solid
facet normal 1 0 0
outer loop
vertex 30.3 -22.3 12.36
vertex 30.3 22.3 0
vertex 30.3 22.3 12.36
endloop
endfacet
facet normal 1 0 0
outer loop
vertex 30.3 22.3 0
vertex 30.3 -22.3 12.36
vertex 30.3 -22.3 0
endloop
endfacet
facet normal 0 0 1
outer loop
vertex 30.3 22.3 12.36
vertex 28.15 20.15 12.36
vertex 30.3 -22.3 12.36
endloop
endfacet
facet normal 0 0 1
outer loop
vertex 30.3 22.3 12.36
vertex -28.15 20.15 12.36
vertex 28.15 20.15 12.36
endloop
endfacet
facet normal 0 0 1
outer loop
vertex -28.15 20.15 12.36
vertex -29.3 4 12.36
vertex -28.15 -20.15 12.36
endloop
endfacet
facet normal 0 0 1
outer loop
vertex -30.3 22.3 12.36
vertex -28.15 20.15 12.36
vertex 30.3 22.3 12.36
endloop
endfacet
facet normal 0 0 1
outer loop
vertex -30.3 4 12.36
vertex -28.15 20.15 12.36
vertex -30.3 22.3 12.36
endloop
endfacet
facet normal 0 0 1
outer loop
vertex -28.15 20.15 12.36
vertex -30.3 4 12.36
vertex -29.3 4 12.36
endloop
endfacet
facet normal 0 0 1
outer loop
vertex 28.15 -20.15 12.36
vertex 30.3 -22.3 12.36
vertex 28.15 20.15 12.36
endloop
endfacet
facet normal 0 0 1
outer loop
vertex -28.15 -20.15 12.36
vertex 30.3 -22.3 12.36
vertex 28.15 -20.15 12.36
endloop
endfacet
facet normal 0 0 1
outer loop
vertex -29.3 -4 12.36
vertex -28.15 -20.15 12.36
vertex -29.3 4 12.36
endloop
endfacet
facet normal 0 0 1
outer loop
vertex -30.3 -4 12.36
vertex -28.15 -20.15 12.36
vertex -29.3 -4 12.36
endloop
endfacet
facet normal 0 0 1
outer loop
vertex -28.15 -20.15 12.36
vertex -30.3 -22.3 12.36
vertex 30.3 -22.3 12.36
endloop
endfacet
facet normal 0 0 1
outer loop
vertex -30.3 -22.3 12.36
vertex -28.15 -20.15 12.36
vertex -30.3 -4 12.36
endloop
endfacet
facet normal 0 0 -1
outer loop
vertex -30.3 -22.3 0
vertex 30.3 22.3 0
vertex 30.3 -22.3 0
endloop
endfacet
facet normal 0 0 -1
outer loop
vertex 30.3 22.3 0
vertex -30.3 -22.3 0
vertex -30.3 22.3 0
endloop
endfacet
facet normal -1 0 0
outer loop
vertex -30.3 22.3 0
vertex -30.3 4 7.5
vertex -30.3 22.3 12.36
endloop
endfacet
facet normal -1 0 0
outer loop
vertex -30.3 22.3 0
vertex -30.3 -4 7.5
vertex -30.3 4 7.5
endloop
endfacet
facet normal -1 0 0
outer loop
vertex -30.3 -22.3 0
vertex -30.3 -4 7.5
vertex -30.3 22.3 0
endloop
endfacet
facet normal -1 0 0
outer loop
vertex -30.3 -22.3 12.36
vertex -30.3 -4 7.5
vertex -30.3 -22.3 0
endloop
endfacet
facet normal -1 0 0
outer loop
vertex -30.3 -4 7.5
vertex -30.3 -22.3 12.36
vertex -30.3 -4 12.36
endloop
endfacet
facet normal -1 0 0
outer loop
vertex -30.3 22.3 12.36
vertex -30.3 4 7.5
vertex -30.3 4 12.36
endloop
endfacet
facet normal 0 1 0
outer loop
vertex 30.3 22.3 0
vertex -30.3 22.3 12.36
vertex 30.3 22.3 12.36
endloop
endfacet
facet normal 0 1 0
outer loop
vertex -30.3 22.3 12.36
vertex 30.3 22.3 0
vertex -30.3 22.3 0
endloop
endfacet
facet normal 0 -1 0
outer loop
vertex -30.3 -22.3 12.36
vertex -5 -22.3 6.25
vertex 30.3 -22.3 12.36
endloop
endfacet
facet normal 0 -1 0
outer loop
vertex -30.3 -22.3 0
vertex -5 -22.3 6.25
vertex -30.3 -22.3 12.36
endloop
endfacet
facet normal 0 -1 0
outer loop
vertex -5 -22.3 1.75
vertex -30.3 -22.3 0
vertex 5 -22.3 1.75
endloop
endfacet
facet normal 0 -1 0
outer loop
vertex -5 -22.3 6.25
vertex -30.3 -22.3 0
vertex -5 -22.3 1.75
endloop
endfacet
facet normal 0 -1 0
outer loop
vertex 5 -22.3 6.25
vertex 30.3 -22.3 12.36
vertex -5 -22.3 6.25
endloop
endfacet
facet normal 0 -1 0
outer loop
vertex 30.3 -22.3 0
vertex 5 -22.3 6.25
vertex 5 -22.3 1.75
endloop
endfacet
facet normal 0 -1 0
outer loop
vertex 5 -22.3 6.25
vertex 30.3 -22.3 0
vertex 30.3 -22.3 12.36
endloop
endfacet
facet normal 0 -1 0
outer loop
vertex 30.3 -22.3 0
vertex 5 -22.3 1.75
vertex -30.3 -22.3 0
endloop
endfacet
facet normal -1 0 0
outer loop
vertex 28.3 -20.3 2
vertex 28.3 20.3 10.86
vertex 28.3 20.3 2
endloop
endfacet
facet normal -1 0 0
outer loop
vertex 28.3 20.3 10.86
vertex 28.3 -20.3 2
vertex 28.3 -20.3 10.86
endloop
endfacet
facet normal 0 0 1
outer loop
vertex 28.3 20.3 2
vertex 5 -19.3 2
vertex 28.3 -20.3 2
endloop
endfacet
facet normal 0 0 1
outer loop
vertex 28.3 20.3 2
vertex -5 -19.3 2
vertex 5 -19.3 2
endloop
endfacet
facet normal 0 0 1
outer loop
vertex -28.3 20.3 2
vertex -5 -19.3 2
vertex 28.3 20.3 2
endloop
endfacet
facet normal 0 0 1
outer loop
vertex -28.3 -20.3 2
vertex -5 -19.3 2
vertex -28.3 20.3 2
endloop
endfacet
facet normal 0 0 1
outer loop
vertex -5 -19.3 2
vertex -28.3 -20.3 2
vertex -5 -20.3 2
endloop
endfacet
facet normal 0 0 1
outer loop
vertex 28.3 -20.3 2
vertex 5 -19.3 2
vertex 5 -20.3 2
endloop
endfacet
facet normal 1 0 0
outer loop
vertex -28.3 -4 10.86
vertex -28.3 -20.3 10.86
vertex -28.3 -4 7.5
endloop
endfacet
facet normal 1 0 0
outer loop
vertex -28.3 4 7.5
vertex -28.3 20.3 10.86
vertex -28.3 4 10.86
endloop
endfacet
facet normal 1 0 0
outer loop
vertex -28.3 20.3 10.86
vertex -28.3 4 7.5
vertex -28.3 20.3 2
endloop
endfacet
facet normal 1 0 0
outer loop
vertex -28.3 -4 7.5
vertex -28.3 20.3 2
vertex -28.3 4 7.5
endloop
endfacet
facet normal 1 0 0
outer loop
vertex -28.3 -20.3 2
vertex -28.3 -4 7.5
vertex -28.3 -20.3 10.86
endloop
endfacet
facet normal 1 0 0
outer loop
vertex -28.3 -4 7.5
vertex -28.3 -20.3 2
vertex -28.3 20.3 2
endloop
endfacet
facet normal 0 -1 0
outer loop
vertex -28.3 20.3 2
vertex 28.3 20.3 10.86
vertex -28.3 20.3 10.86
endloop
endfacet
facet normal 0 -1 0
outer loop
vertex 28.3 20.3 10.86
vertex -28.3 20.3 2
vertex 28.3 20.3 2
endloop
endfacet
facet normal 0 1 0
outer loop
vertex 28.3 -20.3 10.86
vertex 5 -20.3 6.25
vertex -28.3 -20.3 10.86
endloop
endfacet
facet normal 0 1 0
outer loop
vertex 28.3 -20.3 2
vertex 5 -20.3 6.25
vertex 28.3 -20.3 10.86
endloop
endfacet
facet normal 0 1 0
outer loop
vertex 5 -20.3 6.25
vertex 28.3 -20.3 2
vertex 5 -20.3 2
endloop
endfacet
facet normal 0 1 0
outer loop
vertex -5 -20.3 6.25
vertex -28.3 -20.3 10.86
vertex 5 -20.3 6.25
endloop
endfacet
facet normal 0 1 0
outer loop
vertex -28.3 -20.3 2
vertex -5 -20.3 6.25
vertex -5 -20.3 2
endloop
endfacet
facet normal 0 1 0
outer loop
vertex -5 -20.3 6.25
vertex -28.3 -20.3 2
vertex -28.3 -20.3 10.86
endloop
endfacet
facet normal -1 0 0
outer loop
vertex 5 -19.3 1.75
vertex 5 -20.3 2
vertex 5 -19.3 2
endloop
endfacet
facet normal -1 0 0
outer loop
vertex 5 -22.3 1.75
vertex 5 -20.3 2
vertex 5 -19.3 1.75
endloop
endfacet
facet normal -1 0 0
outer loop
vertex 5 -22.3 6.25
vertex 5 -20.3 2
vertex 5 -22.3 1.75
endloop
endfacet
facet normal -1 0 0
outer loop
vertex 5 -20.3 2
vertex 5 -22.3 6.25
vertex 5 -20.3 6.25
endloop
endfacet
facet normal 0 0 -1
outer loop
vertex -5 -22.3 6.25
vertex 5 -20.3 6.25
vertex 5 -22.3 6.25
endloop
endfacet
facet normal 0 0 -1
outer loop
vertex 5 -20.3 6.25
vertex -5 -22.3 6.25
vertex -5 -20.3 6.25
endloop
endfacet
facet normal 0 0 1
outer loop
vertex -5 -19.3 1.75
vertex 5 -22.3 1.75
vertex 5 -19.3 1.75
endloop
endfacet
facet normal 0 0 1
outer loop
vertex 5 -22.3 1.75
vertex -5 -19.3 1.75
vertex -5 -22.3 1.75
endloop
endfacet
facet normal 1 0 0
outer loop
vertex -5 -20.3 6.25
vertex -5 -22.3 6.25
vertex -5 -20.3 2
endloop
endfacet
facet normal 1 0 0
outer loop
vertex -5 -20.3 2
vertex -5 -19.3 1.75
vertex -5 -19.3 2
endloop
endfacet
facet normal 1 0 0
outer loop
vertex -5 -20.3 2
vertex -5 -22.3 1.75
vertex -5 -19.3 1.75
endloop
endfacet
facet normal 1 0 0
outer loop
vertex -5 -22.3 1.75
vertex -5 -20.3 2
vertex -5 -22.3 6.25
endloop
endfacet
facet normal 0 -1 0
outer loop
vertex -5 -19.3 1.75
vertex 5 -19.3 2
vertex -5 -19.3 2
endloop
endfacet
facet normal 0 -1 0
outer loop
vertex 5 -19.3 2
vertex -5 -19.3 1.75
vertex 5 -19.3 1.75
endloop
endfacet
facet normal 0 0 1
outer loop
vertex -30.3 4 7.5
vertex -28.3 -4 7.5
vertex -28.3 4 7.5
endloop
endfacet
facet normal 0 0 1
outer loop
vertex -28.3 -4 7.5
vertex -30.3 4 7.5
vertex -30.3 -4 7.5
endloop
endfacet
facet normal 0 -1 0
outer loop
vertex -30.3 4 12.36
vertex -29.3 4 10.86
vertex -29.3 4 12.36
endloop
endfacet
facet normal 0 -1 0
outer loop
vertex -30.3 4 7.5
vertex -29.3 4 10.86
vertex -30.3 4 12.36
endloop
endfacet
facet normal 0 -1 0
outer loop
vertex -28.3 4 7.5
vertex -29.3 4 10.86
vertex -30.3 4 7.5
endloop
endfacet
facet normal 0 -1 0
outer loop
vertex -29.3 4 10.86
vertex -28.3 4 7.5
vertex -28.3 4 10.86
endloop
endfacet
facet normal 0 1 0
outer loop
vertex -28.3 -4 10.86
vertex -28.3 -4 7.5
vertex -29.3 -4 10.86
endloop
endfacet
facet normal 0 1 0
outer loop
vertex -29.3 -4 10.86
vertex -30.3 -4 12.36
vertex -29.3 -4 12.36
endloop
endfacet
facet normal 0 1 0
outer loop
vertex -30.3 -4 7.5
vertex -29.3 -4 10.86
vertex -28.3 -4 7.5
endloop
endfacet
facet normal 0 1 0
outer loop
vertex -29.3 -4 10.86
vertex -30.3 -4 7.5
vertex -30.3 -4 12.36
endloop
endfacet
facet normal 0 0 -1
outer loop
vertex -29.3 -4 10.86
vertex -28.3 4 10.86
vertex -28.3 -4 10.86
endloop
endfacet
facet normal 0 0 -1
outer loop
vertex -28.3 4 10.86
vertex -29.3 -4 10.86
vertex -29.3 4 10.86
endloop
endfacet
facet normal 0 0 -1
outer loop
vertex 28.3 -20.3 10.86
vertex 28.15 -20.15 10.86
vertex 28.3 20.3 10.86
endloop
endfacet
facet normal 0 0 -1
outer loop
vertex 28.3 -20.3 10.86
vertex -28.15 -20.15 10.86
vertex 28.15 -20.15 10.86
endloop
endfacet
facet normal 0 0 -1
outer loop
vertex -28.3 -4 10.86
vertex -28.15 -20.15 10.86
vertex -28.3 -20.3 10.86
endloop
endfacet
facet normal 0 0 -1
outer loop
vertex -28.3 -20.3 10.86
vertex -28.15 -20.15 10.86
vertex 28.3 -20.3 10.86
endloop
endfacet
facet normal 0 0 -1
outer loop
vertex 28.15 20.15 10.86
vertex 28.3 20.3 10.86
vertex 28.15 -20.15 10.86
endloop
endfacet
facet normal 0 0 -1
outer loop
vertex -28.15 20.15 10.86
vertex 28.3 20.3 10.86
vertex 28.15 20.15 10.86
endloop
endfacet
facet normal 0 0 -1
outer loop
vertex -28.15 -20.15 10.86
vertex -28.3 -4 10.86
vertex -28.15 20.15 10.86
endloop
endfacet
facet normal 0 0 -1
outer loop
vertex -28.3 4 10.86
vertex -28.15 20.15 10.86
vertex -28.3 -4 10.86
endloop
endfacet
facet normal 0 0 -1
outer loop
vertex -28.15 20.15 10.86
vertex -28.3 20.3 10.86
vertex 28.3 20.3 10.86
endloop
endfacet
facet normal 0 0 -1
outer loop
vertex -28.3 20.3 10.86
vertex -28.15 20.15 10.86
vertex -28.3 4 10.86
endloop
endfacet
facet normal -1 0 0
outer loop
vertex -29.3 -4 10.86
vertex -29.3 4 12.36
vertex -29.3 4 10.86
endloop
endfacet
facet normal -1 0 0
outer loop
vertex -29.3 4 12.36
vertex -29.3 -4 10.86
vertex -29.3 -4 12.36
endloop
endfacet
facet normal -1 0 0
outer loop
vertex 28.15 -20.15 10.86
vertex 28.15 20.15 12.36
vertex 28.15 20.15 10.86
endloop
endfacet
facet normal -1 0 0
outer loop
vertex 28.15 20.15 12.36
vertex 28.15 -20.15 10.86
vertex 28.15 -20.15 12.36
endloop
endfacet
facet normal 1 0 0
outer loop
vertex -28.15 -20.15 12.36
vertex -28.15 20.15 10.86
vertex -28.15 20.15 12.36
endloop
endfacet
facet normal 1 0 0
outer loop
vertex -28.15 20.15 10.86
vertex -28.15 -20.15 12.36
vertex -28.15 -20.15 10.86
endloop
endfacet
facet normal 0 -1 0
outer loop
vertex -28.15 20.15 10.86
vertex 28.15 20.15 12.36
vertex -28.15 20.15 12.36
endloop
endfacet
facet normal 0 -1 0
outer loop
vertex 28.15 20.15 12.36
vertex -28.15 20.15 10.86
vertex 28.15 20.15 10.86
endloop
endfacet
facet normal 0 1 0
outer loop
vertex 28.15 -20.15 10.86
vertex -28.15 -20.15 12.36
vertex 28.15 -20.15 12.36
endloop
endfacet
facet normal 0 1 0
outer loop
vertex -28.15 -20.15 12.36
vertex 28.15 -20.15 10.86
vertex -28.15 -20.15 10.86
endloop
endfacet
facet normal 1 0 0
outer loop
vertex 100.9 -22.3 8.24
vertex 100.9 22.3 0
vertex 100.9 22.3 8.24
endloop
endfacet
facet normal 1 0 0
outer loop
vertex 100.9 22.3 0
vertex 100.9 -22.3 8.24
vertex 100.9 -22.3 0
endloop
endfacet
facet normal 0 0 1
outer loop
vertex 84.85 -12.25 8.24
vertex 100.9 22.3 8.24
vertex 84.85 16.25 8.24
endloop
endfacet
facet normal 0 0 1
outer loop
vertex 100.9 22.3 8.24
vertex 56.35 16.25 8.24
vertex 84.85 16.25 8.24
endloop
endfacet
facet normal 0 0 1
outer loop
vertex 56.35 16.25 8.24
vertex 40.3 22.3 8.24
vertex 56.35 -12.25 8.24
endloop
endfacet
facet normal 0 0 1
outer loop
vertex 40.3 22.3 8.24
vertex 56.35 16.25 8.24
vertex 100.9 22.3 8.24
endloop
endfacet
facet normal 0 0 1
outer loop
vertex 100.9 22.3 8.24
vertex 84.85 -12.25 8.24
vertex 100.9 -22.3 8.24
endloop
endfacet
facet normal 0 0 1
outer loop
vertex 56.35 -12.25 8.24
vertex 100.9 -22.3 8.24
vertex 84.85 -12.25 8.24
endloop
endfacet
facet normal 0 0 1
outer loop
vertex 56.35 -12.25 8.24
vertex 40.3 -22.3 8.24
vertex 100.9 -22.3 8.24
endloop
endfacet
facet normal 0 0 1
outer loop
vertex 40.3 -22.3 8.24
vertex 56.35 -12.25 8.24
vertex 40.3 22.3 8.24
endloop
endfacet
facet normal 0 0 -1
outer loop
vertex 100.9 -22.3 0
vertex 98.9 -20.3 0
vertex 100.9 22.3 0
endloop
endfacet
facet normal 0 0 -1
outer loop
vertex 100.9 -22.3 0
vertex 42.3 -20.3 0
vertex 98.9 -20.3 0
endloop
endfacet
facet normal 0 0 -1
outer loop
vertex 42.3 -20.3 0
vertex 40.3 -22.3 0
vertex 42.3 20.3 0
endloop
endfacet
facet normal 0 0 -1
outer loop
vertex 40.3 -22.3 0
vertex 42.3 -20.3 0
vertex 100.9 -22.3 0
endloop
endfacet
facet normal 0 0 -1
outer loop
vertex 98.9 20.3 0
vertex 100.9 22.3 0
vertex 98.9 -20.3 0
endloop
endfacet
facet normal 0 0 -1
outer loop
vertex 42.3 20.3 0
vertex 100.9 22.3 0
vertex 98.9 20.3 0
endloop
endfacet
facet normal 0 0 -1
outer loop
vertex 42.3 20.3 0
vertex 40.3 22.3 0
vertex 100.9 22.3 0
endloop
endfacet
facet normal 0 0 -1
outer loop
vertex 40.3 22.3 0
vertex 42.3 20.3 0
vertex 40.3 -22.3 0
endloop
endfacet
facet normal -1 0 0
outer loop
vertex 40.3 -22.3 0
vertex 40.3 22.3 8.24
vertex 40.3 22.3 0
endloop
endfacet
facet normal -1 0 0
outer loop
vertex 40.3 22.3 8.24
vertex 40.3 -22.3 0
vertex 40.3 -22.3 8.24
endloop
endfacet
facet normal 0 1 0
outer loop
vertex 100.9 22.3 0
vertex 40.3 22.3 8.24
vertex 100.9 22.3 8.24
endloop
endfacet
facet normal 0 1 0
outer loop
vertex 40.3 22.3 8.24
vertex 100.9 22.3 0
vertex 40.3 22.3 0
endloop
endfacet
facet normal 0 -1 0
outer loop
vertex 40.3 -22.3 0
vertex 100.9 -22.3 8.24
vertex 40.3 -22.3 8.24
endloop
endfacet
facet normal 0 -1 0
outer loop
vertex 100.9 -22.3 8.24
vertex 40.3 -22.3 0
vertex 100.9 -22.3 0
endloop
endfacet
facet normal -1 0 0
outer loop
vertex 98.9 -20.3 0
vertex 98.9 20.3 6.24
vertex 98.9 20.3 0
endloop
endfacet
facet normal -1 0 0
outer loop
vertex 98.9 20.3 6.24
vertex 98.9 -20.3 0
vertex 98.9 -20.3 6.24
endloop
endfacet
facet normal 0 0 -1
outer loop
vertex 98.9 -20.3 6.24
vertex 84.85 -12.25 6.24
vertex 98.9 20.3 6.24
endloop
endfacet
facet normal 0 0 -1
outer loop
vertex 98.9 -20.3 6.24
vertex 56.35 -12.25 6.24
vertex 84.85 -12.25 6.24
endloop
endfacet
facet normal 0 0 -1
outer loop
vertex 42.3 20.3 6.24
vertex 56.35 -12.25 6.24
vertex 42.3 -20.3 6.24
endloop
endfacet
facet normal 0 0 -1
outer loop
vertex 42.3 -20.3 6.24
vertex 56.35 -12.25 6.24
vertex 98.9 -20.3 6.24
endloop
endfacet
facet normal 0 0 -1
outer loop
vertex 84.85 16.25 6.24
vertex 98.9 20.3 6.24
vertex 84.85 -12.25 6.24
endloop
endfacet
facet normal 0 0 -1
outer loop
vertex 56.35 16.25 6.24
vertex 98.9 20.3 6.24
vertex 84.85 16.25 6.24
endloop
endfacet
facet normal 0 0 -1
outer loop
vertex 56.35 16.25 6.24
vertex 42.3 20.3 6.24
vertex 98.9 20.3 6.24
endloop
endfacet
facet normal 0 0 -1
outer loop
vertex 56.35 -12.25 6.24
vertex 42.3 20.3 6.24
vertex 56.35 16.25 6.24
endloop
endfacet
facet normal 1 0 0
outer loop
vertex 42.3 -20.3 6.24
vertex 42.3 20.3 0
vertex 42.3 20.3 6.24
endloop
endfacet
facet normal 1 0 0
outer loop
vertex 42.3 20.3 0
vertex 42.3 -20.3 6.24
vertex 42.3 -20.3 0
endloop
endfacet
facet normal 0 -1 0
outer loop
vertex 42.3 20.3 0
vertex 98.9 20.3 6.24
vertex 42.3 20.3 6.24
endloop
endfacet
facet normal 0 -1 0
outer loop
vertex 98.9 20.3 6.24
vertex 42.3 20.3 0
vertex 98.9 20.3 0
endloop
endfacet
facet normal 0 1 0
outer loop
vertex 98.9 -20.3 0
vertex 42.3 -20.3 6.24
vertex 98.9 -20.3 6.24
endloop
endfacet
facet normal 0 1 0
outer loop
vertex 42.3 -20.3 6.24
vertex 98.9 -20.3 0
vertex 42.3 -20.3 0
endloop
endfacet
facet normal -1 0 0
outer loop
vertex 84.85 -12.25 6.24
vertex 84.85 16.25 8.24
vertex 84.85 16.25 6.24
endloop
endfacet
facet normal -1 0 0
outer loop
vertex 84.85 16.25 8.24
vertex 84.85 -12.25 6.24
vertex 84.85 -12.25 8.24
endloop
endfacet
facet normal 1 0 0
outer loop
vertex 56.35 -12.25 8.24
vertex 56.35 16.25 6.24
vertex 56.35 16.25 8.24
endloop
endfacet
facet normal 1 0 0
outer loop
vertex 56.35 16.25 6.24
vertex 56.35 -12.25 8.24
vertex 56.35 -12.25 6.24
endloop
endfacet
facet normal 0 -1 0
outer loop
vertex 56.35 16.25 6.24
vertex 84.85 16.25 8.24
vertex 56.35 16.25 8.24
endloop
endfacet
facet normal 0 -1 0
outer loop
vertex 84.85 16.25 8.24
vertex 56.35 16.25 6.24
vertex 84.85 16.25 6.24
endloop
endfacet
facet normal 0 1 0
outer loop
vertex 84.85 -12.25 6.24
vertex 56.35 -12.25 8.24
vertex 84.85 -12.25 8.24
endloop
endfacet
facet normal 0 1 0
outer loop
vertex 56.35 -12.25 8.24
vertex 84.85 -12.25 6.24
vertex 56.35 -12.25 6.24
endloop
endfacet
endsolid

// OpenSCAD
// file: BOSL2/std.scad
// Minimal BOSL2 compatibility shim for bundled gallery models.
// It implements only the helpers used by the imported OpenSCAD projects.

CENTER = [0, 0, 0];
BOTTOM = [0, 0, -1];
TOP = [0, 0, 1];
LEFT = [-1, 0, 0];
RIGHT = [1, 0, 0];
FRONT = [0, -1, 0];
BACK = [0, 1, 0];

module up(z=0) {
    translate([0, 0, z]) children();
}

module down(z=0) {
    translate([0, 0, -z]) children();
}

module attach(anchor=CENTER) {
    children();
}

module cuboid(size=[1, 1, 1], anchor=CENTER) {
    center = anchor == CENTER;
    translate(center ? [0, 0, 0] : [0, 0, size[2] / 2])
        cube(size, center=true);
    children();
}

module xcyl(h=1, r=1, anchor=CENTER) {
    center = anchor == CENTER;
    translate(center ? [0, 0, 0] : [h / 2, 0, 0])
        rotate([0, 90, 0])
            cylinder(h=h, r=r, center=true);
}
// main file
include <BOSL2/std.scad>

// === DTMB Enclosure v1 — "Apple White" Default Line ===
// Designed for M5Stack CoreInk (56 x 40 x 16mm)
// Style: Clean, minimal, Apple-inspired

// --- CoreInk dimensions ---
ci_w = 56;
ci_h = 40;
ci_d = 16;

// --- Display window ---
disp_w = 28.5;   // slightly larger than 27.6 active area
disp_h = 28.5;
disp_y_offset = 2;

// --- Enclosure parameters ---
wall = 2.0;       // wall thickness (good for Ender 3)
tol = 0.3;        // tolerance for fit
corner_r = 4;     // corner radius (Apple-esque)
lip = 1.5;        // lip height for top/bottom mating

// --- Derived dimensions ---
enc_w = ci_w + 2*wall + 2*tol;
enc_h = ci_h + 2*wall + 2*tol;
enc_d = ci_d + 2*wall + 2*tol;

// --- USB-C cutout ---
usbc_w = 10;
usbc_h = 4.5;

// --- Side button cutout ---
btn_w = 8;
btn_h = 5;
btn_z = 8;

// --- Split height (where top meets bottom) ---
split_z = enc_d * 0.6;  // 60% bottom, 40% top

// =====================
// BOTTOM SHELL
// =====================
module bottom_shell() {
    difference() {
        // Outer shell
        cuboid([enc_w, enc_h, split_z],
               rounding=corner_r,
               edges="Z",
               anchor=BOTTOM);

        // Inner cavity
        translate([0, 0, wall])
            cuboid([enc_w - 2*wall, enc_h - 2*wall, split_z],
                   rounding=corner_r - wall,
                   edges="Z",
                   anchor=BOTTOM);

        // USB-C port cutout (front/bottom edge)
        translate([0, -enc_h/2, wall + 2])
            cuboid([usbc_w, wall*3, usbc_h], anchor=CENTER);

        // Side button cutout (left side)
        translate([-enc_w/2, 0, wall + btn_z])
            cuboid([wall*3, btn_w, btn_h], anchor=CENTER);
    }

    // Mating lip (inner ridge for top to sit on)
    difference() {
        translate([0, 0, split_z - lip])
            cuboid([enc_w - wall, enc_h - wall, lip],
                   rounding=corner_r - wall/2,
                   edges="Z",
                   anchor=BOTTOM);
        translate([0, 0, split_z - lip - 0.01])
            cuboid([enc_w - 2*wall - tol, enc_h - 2*wall - tol, lip + 0.02],
                   rounding=corner_r - wall,
                   edges="Z",
                   anchor=BOTTOM);
    }
}

// =====================
// TOP SHELL (LID)
// =====================
module top_shell() {
    top_z = enc_d - split_z;

    difference() {
        // Outer shell
        cuboid([enc_w, enc_h, top_z],
               rounding=corner_r,
               edges="Z",
               anchor=BOTTOM);

        // Inner cavity
        translate([0, 0, -0.01])
            cuboid([enc_w - 2*wall, enc_h - 2*wall, top_z - wall + 0.01],
                   rounding=corner_r - wall,
                   edges="Z",
                   anchor=BOTTOM);

        // Display window cutout
        translate([0, disp_y_offset, top_z - wall - 0.01])
            cuboid([disp_w, disp_h, wall + 0.02], anchor=BOTTOM);
    }
}

// =====================
// ASSEMBLY VIEW
// =====================

// Show both parts side by side for printing orientation
// (or comment out one to export individually)

// Bottom shell
color("WhiteSmoke")
    bottom_shell();

// Top shell — shown offset for viewing (move next to bottom for print layout)
color("GhostWhite")
    translate([enc_w + 10, 0, 0])
        top_shell();

// Ghost CoreInk for reference (comment out before export)
%translate([0, 0, wall + tol])
    cube([ci_w, ci_h, ci_d], center=true);
